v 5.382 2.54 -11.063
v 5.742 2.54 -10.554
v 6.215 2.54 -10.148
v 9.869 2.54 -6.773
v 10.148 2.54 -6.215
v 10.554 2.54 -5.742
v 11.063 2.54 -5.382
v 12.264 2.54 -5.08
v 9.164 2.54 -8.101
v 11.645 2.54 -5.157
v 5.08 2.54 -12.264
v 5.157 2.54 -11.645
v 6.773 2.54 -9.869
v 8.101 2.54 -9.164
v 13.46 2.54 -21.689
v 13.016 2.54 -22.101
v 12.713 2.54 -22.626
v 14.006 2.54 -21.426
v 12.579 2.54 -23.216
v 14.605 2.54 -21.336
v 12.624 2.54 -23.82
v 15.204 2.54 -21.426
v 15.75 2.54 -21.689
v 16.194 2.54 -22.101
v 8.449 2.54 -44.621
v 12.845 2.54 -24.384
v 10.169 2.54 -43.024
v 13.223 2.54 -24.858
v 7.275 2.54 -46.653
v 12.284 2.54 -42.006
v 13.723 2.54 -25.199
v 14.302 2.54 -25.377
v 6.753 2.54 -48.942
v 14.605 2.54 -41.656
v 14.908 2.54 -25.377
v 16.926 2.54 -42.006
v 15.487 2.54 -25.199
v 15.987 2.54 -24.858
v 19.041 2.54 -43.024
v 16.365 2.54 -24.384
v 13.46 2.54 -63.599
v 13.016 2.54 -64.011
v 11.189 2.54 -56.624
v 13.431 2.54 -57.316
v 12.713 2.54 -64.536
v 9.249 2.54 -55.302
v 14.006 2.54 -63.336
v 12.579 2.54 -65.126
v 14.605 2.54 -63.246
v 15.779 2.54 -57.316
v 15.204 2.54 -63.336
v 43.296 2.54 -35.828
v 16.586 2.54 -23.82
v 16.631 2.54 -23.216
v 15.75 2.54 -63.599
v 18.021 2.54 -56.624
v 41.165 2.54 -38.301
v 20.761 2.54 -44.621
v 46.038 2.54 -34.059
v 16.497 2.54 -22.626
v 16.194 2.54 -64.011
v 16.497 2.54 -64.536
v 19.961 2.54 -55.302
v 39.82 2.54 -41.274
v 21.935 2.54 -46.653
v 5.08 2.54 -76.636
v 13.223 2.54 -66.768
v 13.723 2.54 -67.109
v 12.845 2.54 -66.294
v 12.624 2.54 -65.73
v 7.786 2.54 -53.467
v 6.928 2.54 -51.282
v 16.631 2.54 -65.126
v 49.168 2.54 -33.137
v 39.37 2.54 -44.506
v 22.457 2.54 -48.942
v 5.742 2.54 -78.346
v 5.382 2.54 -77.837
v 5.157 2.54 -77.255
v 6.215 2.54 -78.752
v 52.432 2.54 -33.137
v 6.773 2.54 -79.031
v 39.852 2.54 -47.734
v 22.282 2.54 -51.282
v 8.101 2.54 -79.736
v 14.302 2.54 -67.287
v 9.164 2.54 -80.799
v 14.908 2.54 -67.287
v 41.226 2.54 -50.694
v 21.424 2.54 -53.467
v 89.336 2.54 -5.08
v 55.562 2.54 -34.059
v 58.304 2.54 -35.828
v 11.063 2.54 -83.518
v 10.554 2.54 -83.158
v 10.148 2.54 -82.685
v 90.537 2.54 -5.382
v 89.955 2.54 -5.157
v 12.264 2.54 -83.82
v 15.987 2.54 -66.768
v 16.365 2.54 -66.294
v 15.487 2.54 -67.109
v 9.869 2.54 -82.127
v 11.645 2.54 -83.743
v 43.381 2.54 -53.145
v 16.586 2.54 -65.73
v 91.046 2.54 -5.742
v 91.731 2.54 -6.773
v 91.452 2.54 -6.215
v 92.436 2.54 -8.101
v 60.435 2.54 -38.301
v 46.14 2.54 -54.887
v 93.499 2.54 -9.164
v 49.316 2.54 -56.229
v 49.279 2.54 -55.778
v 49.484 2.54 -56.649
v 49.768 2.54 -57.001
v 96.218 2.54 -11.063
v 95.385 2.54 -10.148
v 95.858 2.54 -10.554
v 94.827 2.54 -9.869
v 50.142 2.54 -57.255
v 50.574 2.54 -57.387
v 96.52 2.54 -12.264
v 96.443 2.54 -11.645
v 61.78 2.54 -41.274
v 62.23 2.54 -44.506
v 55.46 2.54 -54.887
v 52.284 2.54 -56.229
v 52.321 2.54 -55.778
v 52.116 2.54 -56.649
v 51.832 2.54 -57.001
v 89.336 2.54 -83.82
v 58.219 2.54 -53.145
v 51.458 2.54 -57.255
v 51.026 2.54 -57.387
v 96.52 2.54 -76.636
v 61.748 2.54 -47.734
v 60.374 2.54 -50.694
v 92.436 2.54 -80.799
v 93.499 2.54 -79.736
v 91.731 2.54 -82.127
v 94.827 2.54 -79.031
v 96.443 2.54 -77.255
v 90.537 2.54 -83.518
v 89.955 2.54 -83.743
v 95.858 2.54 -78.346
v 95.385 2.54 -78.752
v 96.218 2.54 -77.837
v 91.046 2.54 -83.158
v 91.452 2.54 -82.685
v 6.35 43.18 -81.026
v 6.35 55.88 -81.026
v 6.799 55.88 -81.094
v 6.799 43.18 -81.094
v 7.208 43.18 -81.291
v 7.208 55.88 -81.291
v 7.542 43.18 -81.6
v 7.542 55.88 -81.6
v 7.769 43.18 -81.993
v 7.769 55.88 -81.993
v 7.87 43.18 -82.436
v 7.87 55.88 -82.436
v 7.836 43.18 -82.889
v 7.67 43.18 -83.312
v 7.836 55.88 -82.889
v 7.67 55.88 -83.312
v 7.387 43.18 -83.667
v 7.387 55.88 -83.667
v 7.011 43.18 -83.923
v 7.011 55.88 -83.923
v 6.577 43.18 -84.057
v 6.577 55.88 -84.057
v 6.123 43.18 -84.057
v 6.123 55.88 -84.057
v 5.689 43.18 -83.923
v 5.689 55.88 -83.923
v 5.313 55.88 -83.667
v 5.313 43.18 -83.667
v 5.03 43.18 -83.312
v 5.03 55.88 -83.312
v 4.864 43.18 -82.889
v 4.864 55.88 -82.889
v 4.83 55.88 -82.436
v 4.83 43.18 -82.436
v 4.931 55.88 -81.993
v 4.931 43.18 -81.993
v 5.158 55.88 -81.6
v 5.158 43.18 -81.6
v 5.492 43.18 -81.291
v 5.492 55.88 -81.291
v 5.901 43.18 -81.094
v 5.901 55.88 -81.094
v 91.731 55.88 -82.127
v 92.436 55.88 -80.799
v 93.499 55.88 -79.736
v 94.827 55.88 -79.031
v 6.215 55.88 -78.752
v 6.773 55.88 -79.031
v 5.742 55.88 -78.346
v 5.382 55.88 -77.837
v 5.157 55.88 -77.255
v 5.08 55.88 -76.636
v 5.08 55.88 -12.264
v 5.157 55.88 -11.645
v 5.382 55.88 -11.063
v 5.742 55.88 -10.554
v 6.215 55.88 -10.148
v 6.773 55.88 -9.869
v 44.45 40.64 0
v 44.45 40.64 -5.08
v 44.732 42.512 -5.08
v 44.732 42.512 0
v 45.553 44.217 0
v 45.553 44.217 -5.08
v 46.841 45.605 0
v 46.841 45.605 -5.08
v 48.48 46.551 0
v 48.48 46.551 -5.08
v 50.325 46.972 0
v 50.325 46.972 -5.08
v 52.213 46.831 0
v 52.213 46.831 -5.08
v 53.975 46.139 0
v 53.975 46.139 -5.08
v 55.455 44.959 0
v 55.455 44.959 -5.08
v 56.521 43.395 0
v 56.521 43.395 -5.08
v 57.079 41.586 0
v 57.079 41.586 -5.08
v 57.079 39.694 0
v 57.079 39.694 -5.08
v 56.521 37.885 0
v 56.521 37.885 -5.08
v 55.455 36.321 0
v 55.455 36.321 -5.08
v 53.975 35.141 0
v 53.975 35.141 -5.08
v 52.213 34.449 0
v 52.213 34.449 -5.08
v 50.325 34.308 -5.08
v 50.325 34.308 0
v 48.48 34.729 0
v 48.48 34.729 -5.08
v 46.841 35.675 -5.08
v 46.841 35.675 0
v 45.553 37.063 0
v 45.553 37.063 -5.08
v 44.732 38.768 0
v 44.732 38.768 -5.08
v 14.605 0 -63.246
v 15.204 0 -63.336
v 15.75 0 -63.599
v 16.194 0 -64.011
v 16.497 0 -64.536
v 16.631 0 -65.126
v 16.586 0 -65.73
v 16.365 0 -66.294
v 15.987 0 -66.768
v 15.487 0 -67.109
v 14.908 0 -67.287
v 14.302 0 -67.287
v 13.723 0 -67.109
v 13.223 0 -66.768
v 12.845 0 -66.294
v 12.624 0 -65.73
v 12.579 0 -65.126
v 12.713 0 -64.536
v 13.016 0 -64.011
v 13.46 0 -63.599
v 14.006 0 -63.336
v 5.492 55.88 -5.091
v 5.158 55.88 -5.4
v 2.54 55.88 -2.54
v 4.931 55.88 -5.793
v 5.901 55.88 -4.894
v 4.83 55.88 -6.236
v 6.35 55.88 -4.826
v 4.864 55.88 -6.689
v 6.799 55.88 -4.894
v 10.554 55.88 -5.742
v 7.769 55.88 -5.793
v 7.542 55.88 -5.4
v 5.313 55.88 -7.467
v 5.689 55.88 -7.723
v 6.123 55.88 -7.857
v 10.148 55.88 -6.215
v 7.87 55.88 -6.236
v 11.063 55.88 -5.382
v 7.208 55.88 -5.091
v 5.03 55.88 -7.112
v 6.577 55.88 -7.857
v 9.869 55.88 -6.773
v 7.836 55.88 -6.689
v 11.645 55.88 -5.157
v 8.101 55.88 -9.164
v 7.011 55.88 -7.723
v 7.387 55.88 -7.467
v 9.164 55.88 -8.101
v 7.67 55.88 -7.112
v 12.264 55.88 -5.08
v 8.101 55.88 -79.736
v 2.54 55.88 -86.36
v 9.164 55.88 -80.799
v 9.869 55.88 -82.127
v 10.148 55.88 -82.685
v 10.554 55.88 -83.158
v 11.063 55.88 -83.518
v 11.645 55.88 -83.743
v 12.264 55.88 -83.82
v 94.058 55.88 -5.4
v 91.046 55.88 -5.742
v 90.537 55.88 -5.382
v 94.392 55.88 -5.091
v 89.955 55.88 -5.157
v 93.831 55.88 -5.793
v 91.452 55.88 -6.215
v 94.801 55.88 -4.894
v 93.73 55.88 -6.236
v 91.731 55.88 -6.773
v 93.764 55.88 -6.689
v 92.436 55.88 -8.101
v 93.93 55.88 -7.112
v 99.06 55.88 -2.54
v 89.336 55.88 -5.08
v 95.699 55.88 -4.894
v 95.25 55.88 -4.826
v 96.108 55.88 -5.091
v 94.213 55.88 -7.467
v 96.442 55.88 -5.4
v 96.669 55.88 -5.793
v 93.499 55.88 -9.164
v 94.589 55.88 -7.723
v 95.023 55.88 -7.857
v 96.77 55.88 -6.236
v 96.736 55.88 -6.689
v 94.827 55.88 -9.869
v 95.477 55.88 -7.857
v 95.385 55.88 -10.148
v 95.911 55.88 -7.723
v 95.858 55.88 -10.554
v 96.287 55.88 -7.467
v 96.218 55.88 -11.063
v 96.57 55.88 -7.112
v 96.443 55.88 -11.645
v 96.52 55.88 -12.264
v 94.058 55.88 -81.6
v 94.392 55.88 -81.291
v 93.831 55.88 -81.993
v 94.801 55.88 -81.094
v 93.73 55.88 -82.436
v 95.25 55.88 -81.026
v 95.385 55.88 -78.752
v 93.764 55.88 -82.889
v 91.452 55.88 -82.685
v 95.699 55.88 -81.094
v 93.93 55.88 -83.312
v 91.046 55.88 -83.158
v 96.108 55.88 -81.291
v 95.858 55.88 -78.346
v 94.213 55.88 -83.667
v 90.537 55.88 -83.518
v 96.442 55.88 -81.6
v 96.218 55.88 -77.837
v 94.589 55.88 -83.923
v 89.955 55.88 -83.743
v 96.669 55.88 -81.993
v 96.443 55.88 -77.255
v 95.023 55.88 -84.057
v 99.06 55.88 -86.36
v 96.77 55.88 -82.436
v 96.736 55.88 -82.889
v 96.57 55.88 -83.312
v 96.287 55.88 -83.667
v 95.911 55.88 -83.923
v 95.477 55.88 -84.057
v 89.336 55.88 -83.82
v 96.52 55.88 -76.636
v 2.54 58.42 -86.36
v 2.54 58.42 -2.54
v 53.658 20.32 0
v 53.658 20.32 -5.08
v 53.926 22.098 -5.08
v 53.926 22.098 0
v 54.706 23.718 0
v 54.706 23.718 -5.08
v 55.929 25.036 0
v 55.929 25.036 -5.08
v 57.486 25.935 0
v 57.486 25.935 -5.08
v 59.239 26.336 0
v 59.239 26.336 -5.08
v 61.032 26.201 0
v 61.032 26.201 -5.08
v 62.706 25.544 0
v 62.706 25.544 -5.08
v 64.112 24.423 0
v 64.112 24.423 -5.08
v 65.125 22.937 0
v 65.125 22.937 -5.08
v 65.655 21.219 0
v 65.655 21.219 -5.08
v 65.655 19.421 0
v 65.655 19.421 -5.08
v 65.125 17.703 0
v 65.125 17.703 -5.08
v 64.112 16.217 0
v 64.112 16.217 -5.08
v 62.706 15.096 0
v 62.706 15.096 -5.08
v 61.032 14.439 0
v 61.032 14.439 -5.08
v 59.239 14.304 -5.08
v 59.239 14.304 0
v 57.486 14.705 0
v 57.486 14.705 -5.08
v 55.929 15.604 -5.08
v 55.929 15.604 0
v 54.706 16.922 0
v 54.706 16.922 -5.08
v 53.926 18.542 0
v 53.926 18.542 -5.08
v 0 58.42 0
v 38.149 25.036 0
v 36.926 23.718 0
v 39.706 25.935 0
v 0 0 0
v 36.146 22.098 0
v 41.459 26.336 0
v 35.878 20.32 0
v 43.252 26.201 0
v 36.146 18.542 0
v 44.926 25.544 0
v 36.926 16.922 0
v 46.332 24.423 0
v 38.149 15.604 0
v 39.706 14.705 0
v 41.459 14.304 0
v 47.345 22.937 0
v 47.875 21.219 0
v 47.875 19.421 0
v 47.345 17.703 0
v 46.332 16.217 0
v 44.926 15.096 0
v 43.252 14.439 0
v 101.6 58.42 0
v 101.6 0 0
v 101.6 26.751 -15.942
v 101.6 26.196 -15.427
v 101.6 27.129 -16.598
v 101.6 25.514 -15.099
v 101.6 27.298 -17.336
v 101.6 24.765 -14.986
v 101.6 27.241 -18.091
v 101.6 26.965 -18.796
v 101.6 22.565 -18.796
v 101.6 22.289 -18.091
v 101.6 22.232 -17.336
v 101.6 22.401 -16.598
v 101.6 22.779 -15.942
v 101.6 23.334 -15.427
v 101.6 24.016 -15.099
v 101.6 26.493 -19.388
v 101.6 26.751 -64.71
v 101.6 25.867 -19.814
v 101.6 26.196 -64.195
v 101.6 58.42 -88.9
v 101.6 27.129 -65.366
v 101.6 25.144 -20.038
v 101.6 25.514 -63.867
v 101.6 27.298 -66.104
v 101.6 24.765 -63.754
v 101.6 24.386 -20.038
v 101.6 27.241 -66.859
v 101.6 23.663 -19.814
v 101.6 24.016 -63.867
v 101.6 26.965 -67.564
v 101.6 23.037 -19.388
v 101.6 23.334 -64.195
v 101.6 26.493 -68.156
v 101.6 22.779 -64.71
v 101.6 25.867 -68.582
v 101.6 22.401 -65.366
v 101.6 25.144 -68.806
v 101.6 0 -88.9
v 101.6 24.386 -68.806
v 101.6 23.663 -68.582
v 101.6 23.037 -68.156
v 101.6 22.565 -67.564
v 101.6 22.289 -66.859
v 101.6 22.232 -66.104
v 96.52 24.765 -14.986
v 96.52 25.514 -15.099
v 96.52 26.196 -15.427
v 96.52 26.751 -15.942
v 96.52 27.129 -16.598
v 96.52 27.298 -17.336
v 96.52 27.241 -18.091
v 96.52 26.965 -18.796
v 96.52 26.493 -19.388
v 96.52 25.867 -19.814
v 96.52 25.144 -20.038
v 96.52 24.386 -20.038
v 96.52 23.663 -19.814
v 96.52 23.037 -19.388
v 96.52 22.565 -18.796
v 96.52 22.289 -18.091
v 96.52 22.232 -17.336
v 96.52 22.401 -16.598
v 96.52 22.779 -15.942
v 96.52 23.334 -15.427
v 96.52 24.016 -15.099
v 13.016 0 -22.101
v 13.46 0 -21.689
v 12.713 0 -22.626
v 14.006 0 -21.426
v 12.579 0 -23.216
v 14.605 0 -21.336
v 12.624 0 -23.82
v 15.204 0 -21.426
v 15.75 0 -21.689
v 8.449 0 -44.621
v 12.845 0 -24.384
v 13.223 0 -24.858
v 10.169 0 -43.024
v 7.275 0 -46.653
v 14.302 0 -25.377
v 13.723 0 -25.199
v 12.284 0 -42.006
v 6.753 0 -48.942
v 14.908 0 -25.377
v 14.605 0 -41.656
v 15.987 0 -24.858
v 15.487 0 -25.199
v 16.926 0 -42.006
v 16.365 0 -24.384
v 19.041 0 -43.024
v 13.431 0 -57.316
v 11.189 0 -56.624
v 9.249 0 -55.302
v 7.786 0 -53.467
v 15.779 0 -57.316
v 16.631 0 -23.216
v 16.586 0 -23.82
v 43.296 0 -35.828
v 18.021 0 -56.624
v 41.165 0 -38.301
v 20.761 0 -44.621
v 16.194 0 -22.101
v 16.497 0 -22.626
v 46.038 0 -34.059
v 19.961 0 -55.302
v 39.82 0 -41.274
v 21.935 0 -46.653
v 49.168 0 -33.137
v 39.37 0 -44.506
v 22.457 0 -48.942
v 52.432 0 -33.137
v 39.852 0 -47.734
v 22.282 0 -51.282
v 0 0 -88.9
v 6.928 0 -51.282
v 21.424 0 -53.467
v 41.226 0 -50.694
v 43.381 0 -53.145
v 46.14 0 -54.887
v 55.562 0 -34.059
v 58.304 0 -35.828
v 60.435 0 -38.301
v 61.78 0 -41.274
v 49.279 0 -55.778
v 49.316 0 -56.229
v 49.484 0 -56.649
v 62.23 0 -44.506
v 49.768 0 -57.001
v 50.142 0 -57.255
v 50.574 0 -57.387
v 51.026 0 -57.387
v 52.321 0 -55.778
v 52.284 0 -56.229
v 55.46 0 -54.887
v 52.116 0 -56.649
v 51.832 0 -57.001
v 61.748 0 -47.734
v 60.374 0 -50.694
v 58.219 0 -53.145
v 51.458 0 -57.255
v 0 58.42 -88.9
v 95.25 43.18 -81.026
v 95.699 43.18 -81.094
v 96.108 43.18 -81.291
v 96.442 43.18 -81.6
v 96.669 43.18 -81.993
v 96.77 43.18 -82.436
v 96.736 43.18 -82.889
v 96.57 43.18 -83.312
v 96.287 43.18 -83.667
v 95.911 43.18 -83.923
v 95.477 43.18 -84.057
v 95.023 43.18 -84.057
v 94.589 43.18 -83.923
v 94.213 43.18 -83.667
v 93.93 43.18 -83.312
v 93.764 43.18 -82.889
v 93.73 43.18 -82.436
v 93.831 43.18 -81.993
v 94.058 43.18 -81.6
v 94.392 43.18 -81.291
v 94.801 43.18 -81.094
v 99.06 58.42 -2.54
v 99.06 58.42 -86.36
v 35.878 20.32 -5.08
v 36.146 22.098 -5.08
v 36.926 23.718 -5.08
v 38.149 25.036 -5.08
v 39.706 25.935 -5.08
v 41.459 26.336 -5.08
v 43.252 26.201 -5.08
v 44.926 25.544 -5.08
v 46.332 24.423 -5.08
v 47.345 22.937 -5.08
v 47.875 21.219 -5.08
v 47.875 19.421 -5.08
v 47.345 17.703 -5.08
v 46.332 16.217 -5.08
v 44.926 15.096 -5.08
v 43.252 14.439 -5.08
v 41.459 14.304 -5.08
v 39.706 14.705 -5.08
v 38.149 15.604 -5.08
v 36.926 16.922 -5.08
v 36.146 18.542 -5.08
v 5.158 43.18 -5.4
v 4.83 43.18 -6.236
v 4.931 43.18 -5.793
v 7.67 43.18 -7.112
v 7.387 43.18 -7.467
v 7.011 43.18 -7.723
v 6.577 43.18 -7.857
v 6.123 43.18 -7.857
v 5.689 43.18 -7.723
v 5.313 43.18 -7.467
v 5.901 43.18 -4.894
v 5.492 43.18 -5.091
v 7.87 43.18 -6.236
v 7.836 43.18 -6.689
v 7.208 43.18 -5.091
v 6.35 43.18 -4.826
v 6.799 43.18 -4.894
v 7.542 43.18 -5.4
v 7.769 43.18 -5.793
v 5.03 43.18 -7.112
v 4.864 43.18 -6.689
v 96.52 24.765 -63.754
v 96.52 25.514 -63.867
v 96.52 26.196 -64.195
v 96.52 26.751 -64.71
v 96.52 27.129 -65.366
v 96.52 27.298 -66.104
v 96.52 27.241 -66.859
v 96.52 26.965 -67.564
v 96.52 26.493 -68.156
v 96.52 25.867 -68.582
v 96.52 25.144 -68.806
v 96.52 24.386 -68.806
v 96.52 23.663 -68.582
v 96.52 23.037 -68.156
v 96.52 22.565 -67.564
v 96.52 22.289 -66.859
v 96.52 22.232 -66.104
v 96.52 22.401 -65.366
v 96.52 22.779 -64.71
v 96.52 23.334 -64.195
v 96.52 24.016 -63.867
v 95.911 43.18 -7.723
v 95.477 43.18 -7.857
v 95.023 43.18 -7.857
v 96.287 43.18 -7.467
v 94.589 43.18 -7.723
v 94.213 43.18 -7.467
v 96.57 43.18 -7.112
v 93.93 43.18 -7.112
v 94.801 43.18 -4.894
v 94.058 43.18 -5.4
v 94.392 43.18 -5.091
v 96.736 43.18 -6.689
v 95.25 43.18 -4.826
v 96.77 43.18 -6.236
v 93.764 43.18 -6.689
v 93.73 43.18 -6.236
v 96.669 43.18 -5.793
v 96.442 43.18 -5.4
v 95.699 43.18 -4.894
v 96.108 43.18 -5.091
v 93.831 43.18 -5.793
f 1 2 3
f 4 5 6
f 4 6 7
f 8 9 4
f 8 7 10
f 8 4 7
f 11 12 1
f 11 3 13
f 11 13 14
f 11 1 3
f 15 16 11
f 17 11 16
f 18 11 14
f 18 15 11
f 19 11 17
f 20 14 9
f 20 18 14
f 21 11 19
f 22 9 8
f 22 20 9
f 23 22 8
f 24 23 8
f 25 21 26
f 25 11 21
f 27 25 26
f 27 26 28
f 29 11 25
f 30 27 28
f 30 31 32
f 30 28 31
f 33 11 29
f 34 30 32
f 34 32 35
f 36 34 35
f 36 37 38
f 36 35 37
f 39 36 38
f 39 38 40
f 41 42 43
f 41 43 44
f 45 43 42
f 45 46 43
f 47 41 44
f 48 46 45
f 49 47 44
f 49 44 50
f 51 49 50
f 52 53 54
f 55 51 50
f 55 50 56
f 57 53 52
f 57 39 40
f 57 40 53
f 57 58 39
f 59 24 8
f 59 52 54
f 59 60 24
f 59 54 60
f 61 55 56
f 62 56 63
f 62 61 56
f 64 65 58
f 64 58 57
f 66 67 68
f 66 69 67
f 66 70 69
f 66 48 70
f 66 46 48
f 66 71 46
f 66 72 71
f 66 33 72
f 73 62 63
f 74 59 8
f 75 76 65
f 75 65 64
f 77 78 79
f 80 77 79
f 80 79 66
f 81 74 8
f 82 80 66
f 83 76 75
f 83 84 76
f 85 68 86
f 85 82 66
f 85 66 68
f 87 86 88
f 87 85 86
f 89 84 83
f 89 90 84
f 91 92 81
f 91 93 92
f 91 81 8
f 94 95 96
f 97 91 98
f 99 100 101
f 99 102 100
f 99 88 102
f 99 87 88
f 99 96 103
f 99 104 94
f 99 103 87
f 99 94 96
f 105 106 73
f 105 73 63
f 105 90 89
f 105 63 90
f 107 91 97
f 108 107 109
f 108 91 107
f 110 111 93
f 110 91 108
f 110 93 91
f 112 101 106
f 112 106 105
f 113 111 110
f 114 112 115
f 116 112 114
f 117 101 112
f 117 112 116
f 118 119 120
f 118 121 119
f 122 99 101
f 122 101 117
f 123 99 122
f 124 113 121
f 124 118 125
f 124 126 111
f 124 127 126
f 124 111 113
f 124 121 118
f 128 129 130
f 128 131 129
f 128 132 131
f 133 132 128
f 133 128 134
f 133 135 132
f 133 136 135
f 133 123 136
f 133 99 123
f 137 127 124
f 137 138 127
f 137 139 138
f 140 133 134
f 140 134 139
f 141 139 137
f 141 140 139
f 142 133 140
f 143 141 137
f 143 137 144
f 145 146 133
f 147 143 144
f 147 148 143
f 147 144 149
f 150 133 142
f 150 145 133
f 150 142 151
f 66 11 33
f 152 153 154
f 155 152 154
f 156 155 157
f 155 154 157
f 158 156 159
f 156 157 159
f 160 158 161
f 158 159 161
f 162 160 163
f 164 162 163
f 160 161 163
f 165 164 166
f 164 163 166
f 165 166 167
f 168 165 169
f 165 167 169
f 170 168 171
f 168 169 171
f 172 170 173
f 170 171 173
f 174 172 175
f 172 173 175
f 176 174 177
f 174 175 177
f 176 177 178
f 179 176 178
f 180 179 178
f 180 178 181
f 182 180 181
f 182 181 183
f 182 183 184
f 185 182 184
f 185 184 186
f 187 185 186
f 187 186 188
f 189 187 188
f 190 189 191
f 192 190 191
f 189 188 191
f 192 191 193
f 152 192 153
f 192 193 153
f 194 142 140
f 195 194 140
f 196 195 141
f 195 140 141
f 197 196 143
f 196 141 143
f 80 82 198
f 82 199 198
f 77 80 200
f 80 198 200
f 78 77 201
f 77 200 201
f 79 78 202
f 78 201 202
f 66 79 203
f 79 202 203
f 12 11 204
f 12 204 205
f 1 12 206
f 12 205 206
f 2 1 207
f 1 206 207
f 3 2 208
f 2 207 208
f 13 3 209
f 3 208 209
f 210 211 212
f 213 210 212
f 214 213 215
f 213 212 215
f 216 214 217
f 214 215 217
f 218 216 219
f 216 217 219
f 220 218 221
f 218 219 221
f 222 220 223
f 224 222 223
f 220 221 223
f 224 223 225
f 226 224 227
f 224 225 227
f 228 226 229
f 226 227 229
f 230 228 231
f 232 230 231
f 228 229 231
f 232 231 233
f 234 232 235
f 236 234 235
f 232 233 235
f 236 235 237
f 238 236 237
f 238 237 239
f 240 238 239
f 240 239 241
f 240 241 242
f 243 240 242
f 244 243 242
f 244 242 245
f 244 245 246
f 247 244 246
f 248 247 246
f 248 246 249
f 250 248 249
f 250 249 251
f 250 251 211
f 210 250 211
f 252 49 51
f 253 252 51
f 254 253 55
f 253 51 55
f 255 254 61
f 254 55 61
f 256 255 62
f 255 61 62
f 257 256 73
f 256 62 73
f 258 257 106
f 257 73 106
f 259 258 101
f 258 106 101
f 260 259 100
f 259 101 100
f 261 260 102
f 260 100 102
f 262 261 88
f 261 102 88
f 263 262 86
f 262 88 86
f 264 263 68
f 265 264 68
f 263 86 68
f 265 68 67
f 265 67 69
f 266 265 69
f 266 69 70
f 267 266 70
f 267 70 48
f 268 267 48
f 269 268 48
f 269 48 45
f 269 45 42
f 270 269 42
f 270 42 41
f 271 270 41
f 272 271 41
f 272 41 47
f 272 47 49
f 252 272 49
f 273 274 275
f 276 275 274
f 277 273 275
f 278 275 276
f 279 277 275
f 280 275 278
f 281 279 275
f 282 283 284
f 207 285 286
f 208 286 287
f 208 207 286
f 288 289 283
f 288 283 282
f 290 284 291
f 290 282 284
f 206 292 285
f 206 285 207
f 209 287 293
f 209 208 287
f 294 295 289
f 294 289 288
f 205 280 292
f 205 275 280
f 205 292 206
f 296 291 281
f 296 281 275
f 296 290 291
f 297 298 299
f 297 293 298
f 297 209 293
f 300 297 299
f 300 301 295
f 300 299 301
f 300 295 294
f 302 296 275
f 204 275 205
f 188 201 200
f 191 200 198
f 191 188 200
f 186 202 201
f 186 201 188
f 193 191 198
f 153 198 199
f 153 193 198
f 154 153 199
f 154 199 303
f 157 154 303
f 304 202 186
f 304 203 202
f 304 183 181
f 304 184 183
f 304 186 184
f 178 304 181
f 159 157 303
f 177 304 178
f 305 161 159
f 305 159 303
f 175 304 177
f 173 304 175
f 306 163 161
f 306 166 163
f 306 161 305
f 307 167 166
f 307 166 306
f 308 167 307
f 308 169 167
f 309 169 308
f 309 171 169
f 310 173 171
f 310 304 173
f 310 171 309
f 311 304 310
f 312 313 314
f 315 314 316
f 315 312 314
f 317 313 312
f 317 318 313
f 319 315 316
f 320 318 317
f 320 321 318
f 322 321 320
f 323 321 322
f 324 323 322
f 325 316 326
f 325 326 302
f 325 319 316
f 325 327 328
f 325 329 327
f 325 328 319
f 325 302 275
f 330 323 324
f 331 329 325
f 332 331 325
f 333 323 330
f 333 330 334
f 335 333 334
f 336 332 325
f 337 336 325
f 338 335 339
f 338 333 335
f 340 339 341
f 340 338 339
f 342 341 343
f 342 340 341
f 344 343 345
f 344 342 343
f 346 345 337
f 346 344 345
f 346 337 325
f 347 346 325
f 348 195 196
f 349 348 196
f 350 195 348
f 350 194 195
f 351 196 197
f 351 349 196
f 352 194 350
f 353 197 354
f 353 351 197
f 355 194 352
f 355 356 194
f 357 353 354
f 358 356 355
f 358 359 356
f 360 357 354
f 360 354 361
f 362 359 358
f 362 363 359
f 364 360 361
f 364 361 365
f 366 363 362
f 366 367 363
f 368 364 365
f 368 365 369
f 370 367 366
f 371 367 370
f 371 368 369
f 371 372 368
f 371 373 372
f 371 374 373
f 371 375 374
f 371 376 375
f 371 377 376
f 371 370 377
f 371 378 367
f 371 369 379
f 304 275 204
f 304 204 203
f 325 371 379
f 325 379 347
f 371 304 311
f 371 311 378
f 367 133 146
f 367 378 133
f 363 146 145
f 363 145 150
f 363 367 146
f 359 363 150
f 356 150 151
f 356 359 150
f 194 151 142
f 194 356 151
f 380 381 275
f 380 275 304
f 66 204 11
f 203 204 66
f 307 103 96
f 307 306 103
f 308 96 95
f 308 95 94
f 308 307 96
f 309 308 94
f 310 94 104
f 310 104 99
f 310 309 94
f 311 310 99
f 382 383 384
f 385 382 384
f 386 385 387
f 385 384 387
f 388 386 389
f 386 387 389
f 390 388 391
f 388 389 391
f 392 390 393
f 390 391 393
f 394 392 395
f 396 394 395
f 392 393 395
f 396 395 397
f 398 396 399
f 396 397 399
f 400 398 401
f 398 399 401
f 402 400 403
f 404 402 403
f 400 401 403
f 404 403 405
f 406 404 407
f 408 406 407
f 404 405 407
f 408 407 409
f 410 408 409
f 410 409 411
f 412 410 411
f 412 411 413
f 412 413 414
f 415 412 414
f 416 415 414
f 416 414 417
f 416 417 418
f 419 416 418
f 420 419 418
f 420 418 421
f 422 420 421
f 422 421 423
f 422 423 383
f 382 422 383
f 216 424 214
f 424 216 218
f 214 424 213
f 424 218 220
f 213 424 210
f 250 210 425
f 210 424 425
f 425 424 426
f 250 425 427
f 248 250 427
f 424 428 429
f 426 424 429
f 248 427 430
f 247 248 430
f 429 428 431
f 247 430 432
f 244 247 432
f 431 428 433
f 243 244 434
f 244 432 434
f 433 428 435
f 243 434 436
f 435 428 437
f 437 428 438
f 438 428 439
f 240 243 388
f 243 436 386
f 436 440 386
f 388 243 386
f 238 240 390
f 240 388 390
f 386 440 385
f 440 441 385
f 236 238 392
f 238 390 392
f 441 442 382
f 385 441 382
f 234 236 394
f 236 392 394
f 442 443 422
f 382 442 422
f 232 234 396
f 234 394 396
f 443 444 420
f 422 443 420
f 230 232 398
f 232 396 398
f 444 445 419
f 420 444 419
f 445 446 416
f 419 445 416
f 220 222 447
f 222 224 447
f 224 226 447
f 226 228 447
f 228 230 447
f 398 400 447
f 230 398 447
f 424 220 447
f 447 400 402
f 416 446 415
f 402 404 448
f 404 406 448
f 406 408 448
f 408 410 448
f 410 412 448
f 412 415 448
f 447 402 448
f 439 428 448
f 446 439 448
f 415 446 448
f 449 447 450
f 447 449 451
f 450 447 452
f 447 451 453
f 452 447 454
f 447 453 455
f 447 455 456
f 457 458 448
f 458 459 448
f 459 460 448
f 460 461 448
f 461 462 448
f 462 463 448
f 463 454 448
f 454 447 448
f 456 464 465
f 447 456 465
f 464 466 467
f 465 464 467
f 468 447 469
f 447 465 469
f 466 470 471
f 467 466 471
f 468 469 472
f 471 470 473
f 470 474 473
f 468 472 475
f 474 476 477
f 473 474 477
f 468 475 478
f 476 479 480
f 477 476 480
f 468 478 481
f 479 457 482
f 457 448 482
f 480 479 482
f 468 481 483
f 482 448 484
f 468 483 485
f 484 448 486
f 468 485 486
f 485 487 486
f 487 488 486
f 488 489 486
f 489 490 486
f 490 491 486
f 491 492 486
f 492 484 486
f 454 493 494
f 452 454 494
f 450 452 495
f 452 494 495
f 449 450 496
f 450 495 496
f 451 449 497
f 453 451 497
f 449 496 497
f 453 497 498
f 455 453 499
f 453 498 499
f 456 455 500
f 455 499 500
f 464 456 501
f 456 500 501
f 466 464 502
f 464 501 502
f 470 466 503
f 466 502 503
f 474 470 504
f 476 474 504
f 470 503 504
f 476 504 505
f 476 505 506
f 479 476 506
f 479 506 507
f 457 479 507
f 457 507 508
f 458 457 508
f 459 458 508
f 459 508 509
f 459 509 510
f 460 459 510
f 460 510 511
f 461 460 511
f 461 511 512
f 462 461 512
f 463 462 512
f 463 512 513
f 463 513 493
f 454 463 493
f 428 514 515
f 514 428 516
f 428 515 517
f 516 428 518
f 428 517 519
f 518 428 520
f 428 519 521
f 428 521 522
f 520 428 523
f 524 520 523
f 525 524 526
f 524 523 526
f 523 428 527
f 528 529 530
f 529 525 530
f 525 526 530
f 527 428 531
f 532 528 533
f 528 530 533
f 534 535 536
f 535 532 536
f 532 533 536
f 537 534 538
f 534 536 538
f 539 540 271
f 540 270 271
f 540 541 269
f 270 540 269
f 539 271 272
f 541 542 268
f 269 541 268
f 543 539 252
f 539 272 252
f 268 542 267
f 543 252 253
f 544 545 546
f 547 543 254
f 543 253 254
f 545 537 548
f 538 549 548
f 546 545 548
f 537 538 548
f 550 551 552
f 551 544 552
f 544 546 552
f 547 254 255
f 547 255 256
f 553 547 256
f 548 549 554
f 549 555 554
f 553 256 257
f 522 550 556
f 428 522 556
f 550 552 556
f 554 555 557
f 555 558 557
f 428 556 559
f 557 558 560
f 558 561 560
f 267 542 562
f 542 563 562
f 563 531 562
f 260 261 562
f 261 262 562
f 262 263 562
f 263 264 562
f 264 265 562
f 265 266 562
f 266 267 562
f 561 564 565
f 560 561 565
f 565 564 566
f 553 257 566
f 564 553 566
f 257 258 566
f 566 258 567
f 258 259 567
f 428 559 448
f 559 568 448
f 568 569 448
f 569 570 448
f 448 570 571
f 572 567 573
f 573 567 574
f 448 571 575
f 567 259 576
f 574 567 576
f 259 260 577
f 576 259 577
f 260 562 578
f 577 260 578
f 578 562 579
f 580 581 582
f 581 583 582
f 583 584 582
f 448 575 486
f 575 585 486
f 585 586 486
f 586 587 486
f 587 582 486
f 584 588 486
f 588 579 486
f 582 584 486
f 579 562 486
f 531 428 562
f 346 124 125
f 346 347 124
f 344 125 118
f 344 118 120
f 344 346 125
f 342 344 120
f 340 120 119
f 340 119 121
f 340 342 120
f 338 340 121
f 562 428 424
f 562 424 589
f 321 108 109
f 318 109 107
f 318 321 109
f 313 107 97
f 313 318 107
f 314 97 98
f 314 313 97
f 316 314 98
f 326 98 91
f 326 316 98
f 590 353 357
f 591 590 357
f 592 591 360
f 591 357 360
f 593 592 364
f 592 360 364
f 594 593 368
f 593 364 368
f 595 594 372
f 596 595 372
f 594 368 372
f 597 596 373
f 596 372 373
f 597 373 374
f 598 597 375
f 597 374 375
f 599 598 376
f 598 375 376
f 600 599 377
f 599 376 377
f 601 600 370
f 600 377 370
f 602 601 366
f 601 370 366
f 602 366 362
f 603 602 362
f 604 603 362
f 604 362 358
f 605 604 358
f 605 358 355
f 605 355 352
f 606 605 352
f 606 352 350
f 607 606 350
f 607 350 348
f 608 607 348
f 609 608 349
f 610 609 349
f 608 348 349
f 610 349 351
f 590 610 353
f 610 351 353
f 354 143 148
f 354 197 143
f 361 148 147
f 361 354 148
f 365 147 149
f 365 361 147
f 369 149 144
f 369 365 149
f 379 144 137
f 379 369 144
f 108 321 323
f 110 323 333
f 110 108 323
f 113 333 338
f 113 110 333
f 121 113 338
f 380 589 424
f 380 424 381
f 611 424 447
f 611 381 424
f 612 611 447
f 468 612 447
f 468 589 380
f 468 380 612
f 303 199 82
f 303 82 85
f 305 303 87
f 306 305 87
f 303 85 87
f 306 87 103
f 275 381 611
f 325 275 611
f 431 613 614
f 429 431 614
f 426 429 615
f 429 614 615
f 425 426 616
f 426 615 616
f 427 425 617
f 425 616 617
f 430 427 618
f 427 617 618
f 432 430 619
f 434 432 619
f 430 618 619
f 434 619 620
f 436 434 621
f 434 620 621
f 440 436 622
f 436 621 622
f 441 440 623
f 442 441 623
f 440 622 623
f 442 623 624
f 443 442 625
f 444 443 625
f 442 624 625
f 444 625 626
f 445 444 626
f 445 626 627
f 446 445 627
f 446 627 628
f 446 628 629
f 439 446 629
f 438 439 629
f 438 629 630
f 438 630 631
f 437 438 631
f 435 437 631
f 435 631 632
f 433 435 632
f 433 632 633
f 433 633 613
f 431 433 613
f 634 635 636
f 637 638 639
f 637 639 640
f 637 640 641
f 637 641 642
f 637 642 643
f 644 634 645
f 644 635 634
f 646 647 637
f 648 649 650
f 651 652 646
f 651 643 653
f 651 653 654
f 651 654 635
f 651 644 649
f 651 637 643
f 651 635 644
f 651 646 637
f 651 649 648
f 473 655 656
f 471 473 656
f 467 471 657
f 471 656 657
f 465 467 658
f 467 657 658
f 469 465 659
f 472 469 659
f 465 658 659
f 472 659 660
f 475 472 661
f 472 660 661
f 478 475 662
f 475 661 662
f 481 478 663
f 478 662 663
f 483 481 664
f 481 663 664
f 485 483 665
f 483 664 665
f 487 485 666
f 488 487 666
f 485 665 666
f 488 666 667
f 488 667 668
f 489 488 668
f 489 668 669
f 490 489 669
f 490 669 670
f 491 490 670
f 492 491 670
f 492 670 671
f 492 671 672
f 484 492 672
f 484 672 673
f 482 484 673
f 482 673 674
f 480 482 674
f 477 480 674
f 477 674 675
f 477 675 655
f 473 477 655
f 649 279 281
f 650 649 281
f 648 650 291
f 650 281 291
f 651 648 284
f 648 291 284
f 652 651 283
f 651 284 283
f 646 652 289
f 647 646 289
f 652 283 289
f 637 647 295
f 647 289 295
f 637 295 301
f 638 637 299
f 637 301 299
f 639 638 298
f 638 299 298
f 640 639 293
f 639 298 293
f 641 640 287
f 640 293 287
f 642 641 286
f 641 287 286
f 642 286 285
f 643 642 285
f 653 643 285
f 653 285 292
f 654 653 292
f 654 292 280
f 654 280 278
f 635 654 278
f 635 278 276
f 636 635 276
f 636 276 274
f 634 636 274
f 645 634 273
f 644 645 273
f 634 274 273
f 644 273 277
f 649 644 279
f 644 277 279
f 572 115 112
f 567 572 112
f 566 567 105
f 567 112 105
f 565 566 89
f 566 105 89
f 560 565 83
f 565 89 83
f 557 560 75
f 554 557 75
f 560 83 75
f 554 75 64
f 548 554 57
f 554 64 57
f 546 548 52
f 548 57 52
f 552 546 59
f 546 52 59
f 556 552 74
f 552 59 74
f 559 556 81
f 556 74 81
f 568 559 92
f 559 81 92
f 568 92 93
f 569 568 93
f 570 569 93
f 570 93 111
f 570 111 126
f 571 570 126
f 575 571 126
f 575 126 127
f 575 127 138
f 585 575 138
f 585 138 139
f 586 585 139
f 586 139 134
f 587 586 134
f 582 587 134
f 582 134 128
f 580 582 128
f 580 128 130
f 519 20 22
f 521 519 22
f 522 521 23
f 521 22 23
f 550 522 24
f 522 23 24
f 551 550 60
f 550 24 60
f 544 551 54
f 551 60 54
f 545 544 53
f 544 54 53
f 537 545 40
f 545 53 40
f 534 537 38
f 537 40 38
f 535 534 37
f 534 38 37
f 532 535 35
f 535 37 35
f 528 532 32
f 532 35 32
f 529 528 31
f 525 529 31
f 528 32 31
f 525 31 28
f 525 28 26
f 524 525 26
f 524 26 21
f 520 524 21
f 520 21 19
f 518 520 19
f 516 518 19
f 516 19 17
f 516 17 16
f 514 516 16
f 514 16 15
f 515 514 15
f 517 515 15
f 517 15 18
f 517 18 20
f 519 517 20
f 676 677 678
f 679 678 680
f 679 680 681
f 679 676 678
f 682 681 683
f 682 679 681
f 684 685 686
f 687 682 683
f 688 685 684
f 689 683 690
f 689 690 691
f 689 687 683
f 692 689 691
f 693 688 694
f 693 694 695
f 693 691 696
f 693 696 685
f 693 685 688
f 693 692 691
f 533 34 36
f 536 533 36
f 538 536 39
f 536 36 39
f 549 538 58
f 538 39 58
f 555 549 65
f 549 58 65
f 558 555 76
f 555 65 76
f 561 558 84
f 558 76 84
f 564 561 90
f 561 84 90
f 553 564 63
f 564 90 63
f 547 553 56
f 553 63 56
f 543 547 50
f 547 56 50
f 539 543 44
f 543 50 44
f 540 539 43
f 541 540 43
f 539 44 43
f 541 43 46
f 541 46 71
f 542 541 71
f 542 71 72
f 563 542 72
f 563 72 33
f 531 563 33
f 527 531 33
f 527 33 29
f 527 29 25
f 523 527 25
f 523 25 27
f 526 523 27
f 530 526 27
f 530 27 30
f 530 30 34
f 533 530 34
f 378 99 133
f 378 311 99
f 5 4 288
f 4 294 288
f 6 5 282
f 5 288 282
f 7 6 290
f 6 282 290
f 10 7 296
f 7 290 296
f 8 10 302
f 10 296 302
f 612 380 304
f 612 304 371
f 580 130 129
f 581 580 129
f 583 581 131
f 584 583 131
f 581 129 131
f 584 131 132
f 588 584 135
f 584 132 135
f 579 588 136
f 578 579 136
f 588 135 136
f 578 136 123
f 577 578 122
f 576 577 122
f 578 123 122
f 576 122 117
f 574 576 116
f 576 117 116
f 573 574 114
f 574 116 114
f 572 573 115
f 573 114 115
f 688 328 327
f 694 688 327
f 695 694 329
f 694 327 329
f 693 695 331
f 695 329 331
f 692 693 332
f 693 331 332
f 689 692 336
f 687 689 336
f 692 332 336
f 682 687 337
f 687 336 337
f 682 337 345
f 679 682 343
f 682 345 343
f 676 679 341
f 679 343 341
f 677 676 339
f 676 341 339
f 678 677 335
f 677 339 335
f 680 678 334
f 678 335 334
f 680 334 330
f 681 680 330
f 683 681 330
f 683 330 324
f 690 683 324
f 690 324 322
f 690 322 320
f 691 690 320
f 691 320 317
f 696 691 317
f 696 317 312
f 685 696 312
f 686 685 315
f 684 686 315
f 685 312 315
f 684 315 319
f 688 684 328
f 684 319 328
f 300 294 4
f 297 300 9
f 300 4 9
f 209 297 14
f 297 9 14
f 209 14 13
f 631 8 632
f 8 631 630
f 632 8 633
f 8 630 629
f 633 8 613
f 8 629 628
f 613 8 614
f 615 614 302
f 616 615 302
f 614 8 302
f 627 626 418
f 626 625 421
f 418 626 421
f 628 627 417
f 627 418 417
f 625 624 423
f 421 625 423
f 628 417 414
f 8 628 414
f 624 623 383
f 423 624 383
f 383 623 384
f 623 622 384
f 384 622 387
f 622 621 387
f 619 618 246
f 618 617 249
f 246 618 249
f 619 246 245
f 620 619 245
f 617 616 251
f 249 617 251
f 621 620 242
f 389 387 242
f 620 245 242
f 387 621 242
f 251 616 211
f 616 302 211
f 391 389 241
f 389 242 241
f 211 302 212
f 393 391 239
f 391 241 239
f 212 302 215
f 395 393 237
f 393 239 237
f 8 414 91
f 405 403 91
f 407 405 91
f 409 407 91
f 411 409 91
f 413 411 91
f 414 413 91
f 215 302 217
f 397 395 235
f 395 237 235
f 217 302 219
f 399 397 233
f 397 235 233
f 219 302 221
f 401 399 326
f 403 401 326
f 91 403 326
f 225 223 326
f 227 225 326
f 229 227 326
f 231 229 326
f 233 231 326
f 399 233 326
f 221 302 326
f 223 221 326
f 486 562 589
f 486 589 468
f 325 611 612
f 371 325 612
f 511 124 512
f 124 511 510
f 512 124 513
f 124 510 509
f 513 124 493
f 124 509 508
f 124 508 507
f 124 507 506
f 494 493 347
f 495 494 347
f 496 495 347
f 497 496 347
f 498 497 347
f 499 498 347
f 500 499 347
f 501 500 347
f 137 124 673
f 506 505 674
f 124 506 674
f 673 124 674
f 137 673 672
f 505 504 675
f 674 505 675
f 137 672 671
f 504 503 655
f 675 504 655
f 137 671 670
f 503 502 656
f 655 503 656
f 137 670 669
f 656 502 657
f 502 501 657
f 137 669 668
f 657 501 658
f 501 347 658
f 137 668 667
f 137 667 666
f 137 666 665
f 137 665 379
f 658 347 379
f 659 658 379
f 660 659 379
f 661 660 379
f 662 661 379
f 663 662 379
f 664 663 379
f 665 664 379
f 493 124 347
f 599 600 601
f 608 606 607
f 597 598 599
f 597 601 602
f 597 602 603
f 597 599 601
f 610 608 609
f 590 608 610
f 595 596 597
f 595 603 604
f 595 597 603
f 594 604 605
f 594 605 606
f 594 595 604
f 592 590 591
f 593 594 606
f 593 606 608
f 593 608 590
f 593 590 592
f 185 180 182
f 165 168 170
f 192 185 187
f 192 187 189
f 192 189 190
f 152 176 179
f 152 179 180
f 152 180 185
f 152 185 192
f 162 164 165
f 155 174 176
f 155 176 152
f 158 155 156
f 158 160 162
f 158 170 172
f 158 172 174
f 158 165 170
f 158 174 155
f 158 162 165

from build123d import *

# Parameters (mm, degrees)
SKETCH1_W           = 101.6
SKETCH1_H           = 88.9
BOSS_EXTRUDE1_DEPTH = 58.42
SKETCH2_W           = 91.44
SKETCH2_H           = 78.74
CUT_EXTRUDE1_DEPTH  = 55.88
SKETCH3_R           = 7.874
SKETCH3_R_2         = 2.032
CUT_EXTRUDE2_DEPTH  = 147.110726506
CUT_EXTRUDE3_DEPTH  = 147.110726506
SKETCH6_R           = 2.54
CUT_EXTRUDE4_DEPTH  = 144.639189638
SKETCH8_R           = 6.0325
CUT_EXTRUDE5_DEPTH  = 145.087642773
SKETCH9_W           = 96.52
SKETCH9_H           = 83.82
CUT_EXTRUDE6_DEPTH  = 2.54
SKETCH10_R          = 6.35
CUT_EXTRUDE7_DEPTH  = 145.087642773
BOSS_EXTRUDE2_DEPTH = 53.34
FILLET1_R           = 2.54
SKETCH13_R          = 1.524
CUT_EXTRUDE8_DEPTH  = 12.7


with BuildPart() as part:
    # Sketch1 → Boss-Extrude1 (new body)
    with BuildSketch(Plane(origin=(0, 0, 0), x_dir=(1, 0, 0), z_dir=(0, 1, 0))):
        with Locations((50.8, 44.45)):
            Rectangle(SKETCH1_W, SKETCH1_H)
    extrude(amount=BOSS_EXTRUDE1_DEPTH)

    # Sketch2 → Cut-Extrude1 (cut)
    with BuildSketch(Plane(origin=(0, 58.42, 0), x_dir=(1, 0, 0), z_dir=(0, 1, 0))):
        with Locations((50.8, 44.45)):
            Rectangle(SKETCH2_W, SKETCH2_H)
    extrude(amount=-CUT_EXTRUDE1_DEPTH, mode=Mode.SUBTRACT)

    # Sketch3 → Cut-Extrude2 (cut, through all)
    with BuildSketch(Plane(origin=(0, 2.54, 0), x_dir=(1, 0, 0), z_dir=(0, 1, 0))):
        with Locations(Location((14.605, 49.53, 0), (0, 0, 270))):
            Circle(SKETCH3_R)
        with Locations(Location((14.605, 65.278, 0), (0, 0, 270))):
            Circle(SKETCH3_R_2)
        with Locations(Location((14.605, 23.368, 0), (0, 0, 270))):
            Circle(SKETCH3_R_2)
    extrude(amount=-CUT_EXTRUDE2_DEPTH, mode=Mode.SUBTRACT)

    # Sketch5 → Cut-Extrude3 (cut, through all)
    with BuildSketch(Plane(origin=(0, 2.54, 0), x_dir=(1, 0, 0), z_dir=(0, 1, 0))):
        with BuildLine():
            ThreePointArc((49.279390438, 55.7784), (50.8, 33.02), (52.320609562, 55.7784))
            ThreePointArc((52.320609562, 55.7784), (50.8, 57.404), (49.279390438, 55.7784))
        make_face()
    extrude(amount=-CUT_EXTRUDE3_DEPTH, mode=Mode.SUBTRACT)

    # Sketch6 → Cut-Extrude4 (cut, through all)
    with BuildSketch(Plane.ZY.offset(-96.52)):
        with Locations((-17.526, 24.765)):
            Circle(SKETCH6_R)
        with Locations((-66.294, 24.765)):
            Circle(SKETCH6_R)
    extrude(amount=-CUT_EXTRUDE4_DEPTH, mode=Mode.SUBTRACT)

    # Sketch8 → Cut-Extrude5 (cut, through all)
    with BuildSketch(Plane(origin=(0, 0, -5.08), x_dir=(-1, 0, 0), z_dir=(0, 0, -1))):
        with Locations((-41.91, 20.32)):
            Circle(SKETCH8_R)
        with Locations((-59.69, 20.32)):
            Circle(SKETCH8_R)
    extrude(amount=-CUT_EXTRUDE5_DEPTH, mode=Mode.SUBTRACT)

    # Sketch9 → Cut-Extrude6 (cut)
    with BuildSketch(Plane(origin=(0, 58.42, 0), x_dir=(1, 0, 0), z_dir=(0, 1, 0))):
        with Locations((50.8, 44.45)):
            Rectangle(SKETCH9_W, SKETCH9_H)
    extrude(amount=-CUT_EXTRUDE6_DEPTH, mode=Mode.SUBTRACT)

    # Sketch10 → Cut-Extrude7 (cut, through all)
    with BuildSketch(Plane(origin=(0, 0, -5.08), x_dir=(-1, 0, 0), z_dir=(0, 0, -1))):
        with Locations((-50.8, 40.64)):
            Circle(SKETCH10_R)
    extrude(amount=-CUT_EXTRUDE7_DEPTH, mode=Mode.SUBTRACT)

    # Sketch11 → Boss-Extrude2 (add)
    with BuildSketch(Plane(origin=(0, 2.54, 0), x_dir=(1, 0, 0), z_dir=(0, 1, 0))):
        with BuildLine():
            Line((10.16, 83.82), (5.08, 83.82))
            Line((5.08, 83.82), (5.08, 78.74))
            ThreePointArc((5.08, 78.74), (8.672102448, 80.227897552), (10.16, 83.82))
        make_face()
        with BuildLine():
            Line((5.08, 10.16), (5.08, 5.08))
            Line((5.08, 5.08), (10.16, 5.08))
            ThreePointArc((10.16, 5.08), (8.672102448, 8.672102448), (5.08, 10.16))
        make_face()
        with BuildLine():
            Line((96.52, 10.16), (96.52, 5.08))
            Line((96.52, 5.08), (91.44, 5.08))
            ThreePointArc((91.44, 5.08), (92.927897552, 8.672102448), (96.52, 10.16))
        make_face()
        with BuildLine():
            Line((96.52, 78.74), (96.52, 83.82))
            Line((96.52, 83.82), (91.44, 83.82))
            ThreePointArc((91.44, 83.82), (92.927897552, 80.227897552), (96.52, 78.74))
        make_face()
    extrude(amount=BOSS_EXTRUDE2_DEPTH)

    # Fillet1
    fillet1_edges = [part.edges().sort_by_distance(p)[0] for p in [
        (91.44, 29.21, -5.08),
        (96.52, 29.21, -10.16),
        (91.44, 29.21, -83.82),
        (96.52, 29.21, -78.74),
        (5.08, 29.21, -78.74),
        (10.16, 29.21, -83.82),
        (10.16, 29.21, -5.08),
        (5.08, 29.21, -10.16),
    ]]
    fillet(fillet1_edges, radius=FILLET1_R)

    # Sketch13 → Cut-Extrude8 (cut)
    with BuildSketch(Plane(origin=(0, 55.88, 0), x_dir=(1, 0, 0), z_dir=(0, 1, 0))):
        with Locations(Location((6.35, 82.55, 0), (0, 0, 270))):
            Circle(SKETCH13_R)
        with Locations(Location((95.25, 82.55, 0), (0, 0, 270))):
            Circle(SKETCH13_R)
        with Locations(Location((95.25, 6.35, 0), (0, 0, 270))):
            Circle(SKETCH13_R)
        with Locations(Location((6.35, 6.35, 0), (0, 0, 270))):
            Circle(SKETCH13_R)
    extrude(amount=-CUT_EXTRUDE8_DEPTH, mode=Mode.SUBTRACT)


solid = part.part
